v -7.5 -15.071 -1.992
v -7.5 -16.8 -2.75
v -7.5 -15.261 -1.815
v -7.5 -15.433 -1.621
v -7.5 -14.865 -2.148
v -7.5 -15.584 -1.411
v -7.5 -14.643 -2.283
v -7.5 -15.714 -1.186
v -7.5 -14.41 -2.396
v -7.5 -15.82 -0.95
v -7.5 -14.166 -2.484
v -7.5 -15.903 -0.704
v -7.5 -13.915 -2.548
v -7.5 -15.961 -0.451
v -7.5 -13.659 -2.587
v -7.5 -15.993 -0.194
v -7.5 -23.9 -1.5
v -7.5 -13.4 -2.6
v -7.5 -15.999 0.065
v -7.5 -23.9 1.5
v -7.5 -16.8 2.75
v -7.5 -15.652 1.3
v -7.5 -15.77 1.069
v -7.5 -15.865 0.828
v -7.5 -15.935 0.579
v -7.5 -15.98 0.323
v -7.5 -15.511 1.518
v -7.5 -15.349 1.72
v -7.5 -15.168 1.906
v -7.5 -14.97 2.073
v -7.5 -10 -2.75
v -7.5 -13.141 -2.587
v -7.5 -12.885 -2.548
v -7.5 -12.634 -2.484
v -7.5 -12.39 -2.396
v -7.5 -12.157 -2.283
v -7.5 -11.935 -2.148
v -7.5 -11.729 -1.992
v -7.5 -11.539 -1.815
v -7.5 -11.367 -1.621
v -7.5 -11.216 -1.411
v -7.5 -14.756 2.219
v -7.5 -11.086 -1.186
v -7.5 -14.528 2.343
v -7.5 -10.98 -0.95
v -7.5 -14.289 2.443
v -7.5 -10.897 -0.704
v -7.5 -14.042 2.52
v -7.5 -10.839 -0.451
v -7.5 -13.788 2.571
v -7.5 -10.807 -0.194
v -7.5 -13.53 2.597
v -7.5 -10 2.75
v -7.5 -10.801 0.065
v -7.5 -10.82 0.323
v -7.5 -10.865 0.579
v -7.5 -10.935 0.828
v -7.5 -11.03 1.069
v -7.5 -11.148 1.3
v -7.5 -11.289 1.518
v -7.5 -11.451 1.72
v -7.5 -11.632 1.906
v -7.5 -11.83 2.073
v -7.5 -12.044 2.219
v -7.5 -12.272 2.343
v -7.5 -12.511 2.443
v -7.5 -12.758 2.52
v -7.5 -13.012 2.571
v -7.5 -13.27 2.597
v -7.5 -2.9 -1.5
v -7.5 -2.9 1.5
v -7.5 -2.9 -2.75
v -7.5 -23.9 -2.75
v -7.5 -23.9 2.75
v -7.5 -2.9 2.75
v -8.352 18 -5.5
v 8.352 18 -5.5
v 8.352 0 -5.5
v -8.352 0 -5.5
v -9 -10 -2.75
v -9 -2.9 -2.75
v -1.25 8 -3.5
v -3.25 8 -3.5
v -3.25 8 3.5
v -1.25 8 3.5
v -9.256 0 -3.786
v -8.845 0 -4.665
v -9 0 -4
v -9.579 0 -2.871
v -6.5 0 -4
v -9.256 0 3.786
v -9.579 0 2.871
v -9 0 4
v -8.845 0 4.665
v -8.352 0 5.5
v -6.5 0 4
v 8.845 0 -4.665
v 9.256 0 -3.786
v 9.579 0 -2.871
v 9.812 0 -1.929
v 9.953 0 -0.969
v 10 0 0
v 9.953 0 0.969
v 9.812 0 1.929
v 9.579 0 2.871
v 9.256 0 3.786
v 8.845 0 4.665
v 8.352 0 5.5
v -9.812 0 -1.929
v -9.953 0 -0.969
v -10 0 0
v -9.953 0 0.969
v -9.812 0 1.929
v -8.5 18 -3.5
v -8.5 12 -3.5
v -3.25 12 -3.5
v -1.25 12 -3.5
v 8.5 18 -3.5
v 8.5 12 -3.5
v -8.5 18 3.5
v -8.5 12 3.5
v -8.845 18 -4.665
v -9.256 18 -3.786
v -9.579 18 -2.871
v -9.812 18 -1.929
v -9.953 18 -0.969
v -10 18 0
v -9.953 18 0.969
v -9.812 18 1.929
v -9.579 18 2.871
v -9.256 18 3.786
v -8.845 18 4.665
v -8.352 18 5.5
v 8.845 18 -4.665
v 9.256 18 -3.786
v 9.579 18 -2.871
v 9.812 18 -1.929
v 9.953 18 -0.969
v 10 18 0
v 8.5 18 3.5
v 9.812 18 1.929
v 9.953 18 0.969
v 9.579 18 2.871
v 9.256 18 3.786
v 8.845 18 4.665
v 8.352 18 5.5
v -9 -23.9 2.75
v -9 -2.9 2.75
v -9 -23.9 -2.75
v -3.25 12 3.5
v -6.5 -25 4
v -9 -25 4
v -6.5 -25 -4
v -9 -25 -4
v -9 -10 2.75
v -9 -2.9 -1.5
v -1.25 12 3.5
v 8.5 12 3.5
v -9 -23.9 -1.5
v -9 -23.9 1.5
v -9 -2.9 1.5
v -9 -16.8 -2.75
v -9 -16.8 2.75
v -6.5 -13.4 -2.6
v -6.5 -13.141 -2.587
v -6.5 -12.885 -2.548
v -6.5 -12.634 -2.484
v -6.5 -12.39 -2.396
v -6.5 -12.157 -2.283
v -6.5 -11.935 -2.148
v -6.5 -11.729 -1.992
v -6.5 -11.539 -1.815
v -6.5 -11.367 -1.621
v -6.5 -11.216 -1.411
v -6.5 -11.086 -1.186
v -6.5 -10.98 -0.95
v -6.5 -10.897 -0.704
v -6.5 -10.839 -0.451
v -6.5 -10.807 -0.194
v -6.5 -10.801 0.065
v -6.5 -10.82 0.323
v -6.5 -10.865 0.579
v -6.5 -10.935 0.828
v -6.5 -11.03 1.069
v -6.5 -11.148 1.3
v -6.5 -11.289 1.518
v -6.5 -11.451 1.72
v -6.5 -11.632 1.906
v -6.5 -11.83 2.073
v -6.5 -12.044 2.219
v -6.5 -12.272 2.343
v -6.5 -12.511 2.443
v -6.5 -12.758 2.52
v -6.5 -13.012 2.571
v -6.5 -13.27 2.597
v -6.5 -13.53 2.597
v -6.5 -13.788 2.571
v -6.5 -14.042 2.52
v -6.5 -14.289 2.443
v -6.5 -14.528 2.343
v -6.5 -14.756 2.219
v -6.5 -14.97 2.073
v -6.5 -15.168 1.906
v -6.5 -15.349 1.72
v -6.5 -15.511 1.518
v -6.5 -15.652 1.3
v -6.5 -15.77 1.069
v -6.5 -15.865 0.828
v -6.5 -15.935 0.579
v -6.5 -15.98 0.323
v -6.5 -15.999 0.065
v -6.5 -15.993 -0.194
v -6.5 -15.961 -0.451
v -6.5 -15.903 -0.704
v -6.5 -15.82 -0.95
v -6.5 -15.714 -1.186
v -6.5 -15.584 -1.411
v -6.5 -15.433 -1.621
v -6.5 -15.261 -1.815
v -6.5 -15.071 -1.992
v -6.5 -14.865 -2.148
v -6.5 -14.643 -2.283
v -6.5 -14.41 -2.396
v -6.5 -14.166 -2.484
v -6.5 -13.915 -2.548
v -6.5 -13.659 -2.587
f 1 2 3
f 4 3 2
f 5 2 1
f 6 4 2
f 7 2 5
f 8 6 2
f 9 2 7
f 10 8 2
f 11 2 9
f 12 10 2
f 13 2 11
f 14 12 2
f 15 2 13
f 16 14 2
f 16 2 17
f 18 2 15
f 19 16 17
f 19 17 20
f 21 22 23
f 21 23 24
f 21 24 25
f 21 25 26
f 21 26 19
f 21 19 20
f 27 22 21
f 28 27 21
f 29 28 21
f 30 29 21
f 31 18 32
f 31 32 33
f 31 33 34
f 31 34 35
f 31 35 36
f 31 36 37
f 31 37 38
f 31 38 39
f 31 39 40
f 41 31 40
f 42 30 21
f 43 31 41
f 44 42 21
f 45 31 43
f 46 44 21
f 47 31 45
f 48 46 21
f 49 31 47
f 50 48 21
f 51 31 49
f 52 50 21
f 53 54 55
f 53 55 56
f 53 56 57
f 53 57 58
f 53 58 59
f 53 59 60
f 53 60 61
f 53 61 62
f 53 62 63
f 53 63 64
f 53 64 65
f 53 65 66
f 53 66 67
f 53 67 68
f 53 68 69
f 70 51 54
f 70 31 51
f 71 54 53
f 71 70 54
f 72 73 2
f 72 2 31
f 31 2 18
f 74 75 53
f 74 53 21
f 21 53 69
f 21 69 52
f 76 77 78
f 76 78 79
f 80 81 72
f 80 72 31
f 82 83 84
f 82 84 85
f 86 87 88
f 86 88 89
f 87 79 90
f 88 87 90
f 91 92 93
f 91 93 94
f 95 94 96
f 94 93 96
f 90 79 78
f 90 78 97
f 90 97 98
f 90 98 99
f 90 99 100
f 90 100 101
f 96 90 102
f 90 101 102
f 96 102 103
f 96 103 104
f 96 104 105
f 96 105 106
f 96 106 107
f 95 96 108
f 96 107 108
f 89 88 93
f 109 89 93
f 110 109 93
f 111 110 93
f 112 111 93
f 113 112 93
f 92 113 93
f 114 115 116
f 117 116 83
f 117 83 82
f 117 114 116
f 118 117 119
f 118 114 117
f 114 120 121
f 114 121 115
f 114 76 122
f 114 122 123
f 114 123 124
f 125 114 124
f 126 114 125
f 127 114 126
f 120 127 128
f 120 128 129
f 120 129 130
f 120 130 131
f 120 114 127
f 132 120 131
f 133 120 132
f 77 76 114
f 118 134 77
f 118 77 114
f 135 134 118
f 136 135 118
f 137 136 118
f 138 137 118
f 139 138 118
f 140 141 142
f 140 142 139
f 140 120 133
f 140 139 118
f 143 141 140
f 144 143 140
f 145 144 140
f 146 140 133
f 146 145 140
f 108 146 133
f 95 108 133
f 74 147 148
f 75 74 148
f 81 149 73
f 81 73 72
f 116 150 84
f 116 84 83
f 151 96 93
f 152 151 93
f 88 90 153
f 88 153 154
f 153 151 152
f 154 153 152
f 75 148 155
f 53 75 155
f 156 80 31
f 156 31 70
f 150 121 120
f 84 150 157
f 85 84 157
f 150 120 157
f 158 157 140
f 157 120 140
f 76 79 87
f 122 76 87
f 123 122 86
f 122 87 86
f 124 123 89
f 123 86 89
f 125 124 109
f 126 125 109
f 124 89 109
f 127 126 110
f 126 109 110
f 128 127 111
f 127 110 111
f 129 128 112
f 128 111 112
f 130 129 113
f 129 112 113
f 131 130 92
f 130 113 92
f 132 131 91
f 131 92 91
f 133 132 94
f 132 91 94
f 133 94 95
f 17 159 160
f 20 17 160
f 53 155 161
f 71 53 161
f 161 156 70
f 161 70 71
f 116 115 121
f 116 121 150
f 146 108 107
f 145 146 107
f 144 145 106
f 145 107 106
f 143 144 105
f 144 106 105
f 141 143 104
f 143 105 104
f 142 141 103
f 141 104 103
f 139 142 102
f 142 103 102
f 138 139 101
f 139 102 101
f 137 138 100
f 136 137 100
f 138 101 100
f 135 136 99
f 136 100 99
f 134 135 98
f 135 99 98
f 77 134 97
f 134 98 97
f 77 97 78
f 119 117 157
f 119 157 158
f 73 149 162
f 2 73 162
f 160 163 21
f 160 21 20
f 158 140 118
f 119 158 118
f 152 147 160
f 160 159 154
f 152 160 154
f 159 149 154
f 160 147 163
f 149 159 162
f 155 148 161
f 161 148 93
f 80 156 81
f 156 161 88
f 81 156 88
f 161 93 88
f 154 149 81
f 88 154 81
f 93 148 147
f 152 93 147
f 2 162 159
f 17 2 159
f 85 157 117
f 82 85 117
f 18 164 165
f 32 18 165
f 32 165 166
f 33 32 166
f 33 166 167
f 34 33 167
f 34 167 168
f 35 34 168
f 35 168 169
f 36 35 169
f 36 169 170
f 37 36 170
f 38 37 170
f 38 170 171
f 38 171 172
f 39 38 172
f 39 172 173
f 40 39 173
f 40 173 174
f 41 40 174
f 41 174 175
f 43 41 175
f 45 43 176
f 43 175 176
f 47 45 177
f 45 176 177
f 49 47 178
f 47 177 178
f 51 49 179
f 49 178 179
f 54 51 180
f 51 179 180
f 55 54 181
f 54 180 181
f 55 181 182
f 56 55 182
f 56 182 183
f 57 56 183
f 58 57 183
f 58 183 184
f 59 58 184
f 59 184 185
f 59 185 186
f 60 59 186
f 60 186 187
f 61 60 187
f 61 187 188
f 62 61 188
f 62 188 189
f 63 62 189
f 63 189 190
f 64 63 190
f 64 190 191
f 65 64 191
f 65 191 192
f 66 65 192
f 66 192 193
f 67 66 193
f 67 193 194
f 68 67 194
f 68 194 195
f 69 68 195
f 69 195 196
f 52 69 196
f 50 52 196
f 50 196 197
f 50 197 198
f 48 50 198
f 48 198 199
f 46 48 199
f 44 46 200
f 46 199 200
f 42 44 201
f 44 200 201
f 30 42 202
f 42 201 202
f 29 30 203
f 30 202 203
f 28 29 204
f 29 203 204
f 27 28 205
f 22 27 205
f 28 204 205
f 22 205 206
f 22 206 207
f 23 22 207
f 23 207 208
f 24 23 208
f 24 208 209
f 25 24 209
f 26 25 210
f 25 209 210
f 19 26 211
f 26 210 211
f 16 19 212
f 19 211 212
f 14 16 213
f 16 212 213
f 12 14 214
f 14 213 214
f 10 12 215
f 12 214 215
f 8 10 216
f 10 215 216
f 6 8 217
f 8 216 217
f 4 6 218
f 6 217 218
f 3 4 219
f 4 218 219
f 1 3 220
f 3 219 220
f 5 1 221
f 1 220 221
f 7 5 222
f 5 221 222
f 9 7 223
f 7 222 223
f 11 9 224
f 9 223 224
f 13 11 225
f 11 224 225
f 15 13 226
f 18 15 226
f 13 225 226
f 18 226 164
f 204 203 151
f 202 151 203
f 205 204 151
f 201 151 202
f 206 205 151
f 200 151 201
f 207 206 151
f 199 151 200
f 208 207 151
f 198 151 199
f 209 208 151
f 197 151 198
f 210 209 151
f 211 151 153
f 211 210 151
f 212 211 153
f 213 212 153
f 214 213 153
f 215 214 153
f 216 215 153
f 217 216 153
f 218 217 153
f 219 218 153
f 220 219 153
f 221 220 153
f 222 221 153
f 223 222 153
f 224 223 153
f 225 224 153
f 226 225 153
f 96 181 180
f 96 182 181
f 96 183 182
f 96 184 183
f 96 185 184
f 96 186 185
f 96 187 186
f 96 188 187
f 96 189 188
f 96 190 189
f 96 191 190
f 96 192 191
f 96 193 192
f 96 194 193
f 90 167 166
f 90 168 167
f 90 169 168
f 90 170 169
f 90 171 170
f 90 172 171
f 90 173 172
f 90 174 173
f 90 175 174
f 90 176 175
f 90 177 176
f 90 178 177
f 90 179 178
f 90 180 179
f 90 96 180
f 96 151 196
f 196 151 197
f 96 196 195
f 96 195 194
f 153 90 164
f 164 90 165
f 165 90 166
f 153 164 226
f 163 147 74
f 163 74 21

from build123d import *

# Parameters (mm, degrees)
SKETCH3_R           = 10
BOSS_EXTRUDE1_DEPTH = 18
SKETCH4_W           = 2.5
SKETCH4_H           = 8
BOSS_EXTRUDE2_DEPTH = 25
CUT_EXTRUDE1_REACH  = 33.579
SKETCH5_R           = 2.6
SKETCH7_W           = 17
SKETCH7_H           = 7
CUT_EXTRUDE3_DEPTH  = 6
SKETCH8_W           = 2
SKETCH8_H           = 7
CUT_EXTRUDE4_DEPTH  = 4
SKETCH11_W          = 5.5
SKETCH11_H          = 21
CUT_EXTRUDE7_DEPTH  = 1.5
CUT_EXTRUDE5_DEPTH  = 43
BOSS_EXTRUDE3_DEPTH = 1.5


with BuildPart() as part:
    # Sketch3 → Boss-Extrude1 (new body)
    with BuildSketch(Plane(origin=(0, 0, 0), x_dir=(1, 0, 0), z_dir=(0, 1, 0))):
        with Locations(Location((0, 0, 0), (0, 0, 270))):
            Circle(SKETCH3_R)
    extrude(amount=BOSS_EXTRUDE1_DEPTH)

    # Sketch4 → Boss-Extrude2 (add)
    with BuildSketch(Plane(origin=(0, 0, 0), x_dir=(-1, 0, 0), z_dir=(0, -1, 0))):
        with Locations((7.75, 0)):
            Rectangle(SKETCH4_W, SKETCH4_H)
    extrude(amount=BOSS_EXTRUDE2_DEPTH)

    # Sketch5 → Cut-Extrude1 (cut, up to next)
    with BuildSketch(Plane(origin=(-6.5, 0, 0), x_dir=(0, 0, -1), z_dir=(1, 0, 0)), mode=Mode.PRIVATE) as cut_extrude1_sk1:
        with Locations((0, -13.4)):
            Circle(SKETCH5_R)
    cut_extrude1_tool1 = extrude(cut_extrude1_sk1.sketch, amount=-CUT_EXTRUDE1_REACH, mode=Mode.PRIVATE) & part.part
    add(cut_extrude1_tool1.solids().sort_by_distance((-6.5, -13.4, 0))[0], mode=Mode.SUBTRACT)

    # Sketch7 → Cut-Extrude3 (cut)
    with BuildSketch(Plane(origin=(0, 18, 0), x_dir=(1, 0, 0), z_dir=(0, 1, 0))):
        Rectangle(SKETCH7_W, SKETCH7_H)
    extrude(amount=-CUT_EXTRUDE3_DEPTH, mode=Mode.SUBTRACT)

    # Sketch8 → Cut-Extrude4 (cut)
    with BuildSketch(Plane(origin=(0, 12, 0), x_dir=(1, 0, 0), z_dir=(0, 1, 0))):
        with Locations((-2.25, 0)):
            Rectangle(SKETCH8_W, SKETCH8_H)
    extrude(amount=-CUT_EXTRUDE4_DEPTH, mode=Mode.SUBTRACT)

    # Sketch11 → Cut-Extrude7 (cut)
    with BuildSketch(Plane.ZY.offset(9)):
        with Locations((0, -13.4)):
            Rectangle(SKETCH11_W, SKETCH11_H)
    extrude(amount=-CUT_EXTRUDE7_DEPTH, mode=Mode.SUBTRACT)

    # Sketch9 → Cut-Extrude5 (cut)
    with BuildSketch(Plane.XZ):
        with BuildLine():
            Line((8.351646544, -5.5), (-8.351646544, -5.5))
            ThreePointArc((-8.351646544, -5.5), (0, -10), (8.351646544, -5.5))
        make_face()
        with BuildLine():
            Line((8.351646544, 5.5), (-8.351646544, 5.5))
            ThreePointArc((-8.351646544, 5.5), (0, 10), (8.351646544, 5.5))
        make_face()
    extrude(amount=-CUT_EXTRUDE5_DEPTH, mode=Mode.SUBTRACT)

    # Sketch10 → Boss-Extrude3 (add)
    with BuildSketch(Plane.ZY.offset(9)):
        Polygon((-2.749970665, -23.9), (-2.749970665, -16.8), (-1.499970665, -23.9), align=None)
        Polygon((1.499970665, -23.9), (2.749970665, -23.9), (2.749970665, -16.8), align=None)
        Polygon((2.749970665, -2.9), (2.749970665, -10), (1.499970665, -2.9), align=None)
        Polygon((-1.499970665, -2.9), (-2.749970665, -2.9), (-2.749970665, -10), align=None)
    extrude(amount=-BOSS_EXTRUDE3_DEPTH)


solid = part.part
